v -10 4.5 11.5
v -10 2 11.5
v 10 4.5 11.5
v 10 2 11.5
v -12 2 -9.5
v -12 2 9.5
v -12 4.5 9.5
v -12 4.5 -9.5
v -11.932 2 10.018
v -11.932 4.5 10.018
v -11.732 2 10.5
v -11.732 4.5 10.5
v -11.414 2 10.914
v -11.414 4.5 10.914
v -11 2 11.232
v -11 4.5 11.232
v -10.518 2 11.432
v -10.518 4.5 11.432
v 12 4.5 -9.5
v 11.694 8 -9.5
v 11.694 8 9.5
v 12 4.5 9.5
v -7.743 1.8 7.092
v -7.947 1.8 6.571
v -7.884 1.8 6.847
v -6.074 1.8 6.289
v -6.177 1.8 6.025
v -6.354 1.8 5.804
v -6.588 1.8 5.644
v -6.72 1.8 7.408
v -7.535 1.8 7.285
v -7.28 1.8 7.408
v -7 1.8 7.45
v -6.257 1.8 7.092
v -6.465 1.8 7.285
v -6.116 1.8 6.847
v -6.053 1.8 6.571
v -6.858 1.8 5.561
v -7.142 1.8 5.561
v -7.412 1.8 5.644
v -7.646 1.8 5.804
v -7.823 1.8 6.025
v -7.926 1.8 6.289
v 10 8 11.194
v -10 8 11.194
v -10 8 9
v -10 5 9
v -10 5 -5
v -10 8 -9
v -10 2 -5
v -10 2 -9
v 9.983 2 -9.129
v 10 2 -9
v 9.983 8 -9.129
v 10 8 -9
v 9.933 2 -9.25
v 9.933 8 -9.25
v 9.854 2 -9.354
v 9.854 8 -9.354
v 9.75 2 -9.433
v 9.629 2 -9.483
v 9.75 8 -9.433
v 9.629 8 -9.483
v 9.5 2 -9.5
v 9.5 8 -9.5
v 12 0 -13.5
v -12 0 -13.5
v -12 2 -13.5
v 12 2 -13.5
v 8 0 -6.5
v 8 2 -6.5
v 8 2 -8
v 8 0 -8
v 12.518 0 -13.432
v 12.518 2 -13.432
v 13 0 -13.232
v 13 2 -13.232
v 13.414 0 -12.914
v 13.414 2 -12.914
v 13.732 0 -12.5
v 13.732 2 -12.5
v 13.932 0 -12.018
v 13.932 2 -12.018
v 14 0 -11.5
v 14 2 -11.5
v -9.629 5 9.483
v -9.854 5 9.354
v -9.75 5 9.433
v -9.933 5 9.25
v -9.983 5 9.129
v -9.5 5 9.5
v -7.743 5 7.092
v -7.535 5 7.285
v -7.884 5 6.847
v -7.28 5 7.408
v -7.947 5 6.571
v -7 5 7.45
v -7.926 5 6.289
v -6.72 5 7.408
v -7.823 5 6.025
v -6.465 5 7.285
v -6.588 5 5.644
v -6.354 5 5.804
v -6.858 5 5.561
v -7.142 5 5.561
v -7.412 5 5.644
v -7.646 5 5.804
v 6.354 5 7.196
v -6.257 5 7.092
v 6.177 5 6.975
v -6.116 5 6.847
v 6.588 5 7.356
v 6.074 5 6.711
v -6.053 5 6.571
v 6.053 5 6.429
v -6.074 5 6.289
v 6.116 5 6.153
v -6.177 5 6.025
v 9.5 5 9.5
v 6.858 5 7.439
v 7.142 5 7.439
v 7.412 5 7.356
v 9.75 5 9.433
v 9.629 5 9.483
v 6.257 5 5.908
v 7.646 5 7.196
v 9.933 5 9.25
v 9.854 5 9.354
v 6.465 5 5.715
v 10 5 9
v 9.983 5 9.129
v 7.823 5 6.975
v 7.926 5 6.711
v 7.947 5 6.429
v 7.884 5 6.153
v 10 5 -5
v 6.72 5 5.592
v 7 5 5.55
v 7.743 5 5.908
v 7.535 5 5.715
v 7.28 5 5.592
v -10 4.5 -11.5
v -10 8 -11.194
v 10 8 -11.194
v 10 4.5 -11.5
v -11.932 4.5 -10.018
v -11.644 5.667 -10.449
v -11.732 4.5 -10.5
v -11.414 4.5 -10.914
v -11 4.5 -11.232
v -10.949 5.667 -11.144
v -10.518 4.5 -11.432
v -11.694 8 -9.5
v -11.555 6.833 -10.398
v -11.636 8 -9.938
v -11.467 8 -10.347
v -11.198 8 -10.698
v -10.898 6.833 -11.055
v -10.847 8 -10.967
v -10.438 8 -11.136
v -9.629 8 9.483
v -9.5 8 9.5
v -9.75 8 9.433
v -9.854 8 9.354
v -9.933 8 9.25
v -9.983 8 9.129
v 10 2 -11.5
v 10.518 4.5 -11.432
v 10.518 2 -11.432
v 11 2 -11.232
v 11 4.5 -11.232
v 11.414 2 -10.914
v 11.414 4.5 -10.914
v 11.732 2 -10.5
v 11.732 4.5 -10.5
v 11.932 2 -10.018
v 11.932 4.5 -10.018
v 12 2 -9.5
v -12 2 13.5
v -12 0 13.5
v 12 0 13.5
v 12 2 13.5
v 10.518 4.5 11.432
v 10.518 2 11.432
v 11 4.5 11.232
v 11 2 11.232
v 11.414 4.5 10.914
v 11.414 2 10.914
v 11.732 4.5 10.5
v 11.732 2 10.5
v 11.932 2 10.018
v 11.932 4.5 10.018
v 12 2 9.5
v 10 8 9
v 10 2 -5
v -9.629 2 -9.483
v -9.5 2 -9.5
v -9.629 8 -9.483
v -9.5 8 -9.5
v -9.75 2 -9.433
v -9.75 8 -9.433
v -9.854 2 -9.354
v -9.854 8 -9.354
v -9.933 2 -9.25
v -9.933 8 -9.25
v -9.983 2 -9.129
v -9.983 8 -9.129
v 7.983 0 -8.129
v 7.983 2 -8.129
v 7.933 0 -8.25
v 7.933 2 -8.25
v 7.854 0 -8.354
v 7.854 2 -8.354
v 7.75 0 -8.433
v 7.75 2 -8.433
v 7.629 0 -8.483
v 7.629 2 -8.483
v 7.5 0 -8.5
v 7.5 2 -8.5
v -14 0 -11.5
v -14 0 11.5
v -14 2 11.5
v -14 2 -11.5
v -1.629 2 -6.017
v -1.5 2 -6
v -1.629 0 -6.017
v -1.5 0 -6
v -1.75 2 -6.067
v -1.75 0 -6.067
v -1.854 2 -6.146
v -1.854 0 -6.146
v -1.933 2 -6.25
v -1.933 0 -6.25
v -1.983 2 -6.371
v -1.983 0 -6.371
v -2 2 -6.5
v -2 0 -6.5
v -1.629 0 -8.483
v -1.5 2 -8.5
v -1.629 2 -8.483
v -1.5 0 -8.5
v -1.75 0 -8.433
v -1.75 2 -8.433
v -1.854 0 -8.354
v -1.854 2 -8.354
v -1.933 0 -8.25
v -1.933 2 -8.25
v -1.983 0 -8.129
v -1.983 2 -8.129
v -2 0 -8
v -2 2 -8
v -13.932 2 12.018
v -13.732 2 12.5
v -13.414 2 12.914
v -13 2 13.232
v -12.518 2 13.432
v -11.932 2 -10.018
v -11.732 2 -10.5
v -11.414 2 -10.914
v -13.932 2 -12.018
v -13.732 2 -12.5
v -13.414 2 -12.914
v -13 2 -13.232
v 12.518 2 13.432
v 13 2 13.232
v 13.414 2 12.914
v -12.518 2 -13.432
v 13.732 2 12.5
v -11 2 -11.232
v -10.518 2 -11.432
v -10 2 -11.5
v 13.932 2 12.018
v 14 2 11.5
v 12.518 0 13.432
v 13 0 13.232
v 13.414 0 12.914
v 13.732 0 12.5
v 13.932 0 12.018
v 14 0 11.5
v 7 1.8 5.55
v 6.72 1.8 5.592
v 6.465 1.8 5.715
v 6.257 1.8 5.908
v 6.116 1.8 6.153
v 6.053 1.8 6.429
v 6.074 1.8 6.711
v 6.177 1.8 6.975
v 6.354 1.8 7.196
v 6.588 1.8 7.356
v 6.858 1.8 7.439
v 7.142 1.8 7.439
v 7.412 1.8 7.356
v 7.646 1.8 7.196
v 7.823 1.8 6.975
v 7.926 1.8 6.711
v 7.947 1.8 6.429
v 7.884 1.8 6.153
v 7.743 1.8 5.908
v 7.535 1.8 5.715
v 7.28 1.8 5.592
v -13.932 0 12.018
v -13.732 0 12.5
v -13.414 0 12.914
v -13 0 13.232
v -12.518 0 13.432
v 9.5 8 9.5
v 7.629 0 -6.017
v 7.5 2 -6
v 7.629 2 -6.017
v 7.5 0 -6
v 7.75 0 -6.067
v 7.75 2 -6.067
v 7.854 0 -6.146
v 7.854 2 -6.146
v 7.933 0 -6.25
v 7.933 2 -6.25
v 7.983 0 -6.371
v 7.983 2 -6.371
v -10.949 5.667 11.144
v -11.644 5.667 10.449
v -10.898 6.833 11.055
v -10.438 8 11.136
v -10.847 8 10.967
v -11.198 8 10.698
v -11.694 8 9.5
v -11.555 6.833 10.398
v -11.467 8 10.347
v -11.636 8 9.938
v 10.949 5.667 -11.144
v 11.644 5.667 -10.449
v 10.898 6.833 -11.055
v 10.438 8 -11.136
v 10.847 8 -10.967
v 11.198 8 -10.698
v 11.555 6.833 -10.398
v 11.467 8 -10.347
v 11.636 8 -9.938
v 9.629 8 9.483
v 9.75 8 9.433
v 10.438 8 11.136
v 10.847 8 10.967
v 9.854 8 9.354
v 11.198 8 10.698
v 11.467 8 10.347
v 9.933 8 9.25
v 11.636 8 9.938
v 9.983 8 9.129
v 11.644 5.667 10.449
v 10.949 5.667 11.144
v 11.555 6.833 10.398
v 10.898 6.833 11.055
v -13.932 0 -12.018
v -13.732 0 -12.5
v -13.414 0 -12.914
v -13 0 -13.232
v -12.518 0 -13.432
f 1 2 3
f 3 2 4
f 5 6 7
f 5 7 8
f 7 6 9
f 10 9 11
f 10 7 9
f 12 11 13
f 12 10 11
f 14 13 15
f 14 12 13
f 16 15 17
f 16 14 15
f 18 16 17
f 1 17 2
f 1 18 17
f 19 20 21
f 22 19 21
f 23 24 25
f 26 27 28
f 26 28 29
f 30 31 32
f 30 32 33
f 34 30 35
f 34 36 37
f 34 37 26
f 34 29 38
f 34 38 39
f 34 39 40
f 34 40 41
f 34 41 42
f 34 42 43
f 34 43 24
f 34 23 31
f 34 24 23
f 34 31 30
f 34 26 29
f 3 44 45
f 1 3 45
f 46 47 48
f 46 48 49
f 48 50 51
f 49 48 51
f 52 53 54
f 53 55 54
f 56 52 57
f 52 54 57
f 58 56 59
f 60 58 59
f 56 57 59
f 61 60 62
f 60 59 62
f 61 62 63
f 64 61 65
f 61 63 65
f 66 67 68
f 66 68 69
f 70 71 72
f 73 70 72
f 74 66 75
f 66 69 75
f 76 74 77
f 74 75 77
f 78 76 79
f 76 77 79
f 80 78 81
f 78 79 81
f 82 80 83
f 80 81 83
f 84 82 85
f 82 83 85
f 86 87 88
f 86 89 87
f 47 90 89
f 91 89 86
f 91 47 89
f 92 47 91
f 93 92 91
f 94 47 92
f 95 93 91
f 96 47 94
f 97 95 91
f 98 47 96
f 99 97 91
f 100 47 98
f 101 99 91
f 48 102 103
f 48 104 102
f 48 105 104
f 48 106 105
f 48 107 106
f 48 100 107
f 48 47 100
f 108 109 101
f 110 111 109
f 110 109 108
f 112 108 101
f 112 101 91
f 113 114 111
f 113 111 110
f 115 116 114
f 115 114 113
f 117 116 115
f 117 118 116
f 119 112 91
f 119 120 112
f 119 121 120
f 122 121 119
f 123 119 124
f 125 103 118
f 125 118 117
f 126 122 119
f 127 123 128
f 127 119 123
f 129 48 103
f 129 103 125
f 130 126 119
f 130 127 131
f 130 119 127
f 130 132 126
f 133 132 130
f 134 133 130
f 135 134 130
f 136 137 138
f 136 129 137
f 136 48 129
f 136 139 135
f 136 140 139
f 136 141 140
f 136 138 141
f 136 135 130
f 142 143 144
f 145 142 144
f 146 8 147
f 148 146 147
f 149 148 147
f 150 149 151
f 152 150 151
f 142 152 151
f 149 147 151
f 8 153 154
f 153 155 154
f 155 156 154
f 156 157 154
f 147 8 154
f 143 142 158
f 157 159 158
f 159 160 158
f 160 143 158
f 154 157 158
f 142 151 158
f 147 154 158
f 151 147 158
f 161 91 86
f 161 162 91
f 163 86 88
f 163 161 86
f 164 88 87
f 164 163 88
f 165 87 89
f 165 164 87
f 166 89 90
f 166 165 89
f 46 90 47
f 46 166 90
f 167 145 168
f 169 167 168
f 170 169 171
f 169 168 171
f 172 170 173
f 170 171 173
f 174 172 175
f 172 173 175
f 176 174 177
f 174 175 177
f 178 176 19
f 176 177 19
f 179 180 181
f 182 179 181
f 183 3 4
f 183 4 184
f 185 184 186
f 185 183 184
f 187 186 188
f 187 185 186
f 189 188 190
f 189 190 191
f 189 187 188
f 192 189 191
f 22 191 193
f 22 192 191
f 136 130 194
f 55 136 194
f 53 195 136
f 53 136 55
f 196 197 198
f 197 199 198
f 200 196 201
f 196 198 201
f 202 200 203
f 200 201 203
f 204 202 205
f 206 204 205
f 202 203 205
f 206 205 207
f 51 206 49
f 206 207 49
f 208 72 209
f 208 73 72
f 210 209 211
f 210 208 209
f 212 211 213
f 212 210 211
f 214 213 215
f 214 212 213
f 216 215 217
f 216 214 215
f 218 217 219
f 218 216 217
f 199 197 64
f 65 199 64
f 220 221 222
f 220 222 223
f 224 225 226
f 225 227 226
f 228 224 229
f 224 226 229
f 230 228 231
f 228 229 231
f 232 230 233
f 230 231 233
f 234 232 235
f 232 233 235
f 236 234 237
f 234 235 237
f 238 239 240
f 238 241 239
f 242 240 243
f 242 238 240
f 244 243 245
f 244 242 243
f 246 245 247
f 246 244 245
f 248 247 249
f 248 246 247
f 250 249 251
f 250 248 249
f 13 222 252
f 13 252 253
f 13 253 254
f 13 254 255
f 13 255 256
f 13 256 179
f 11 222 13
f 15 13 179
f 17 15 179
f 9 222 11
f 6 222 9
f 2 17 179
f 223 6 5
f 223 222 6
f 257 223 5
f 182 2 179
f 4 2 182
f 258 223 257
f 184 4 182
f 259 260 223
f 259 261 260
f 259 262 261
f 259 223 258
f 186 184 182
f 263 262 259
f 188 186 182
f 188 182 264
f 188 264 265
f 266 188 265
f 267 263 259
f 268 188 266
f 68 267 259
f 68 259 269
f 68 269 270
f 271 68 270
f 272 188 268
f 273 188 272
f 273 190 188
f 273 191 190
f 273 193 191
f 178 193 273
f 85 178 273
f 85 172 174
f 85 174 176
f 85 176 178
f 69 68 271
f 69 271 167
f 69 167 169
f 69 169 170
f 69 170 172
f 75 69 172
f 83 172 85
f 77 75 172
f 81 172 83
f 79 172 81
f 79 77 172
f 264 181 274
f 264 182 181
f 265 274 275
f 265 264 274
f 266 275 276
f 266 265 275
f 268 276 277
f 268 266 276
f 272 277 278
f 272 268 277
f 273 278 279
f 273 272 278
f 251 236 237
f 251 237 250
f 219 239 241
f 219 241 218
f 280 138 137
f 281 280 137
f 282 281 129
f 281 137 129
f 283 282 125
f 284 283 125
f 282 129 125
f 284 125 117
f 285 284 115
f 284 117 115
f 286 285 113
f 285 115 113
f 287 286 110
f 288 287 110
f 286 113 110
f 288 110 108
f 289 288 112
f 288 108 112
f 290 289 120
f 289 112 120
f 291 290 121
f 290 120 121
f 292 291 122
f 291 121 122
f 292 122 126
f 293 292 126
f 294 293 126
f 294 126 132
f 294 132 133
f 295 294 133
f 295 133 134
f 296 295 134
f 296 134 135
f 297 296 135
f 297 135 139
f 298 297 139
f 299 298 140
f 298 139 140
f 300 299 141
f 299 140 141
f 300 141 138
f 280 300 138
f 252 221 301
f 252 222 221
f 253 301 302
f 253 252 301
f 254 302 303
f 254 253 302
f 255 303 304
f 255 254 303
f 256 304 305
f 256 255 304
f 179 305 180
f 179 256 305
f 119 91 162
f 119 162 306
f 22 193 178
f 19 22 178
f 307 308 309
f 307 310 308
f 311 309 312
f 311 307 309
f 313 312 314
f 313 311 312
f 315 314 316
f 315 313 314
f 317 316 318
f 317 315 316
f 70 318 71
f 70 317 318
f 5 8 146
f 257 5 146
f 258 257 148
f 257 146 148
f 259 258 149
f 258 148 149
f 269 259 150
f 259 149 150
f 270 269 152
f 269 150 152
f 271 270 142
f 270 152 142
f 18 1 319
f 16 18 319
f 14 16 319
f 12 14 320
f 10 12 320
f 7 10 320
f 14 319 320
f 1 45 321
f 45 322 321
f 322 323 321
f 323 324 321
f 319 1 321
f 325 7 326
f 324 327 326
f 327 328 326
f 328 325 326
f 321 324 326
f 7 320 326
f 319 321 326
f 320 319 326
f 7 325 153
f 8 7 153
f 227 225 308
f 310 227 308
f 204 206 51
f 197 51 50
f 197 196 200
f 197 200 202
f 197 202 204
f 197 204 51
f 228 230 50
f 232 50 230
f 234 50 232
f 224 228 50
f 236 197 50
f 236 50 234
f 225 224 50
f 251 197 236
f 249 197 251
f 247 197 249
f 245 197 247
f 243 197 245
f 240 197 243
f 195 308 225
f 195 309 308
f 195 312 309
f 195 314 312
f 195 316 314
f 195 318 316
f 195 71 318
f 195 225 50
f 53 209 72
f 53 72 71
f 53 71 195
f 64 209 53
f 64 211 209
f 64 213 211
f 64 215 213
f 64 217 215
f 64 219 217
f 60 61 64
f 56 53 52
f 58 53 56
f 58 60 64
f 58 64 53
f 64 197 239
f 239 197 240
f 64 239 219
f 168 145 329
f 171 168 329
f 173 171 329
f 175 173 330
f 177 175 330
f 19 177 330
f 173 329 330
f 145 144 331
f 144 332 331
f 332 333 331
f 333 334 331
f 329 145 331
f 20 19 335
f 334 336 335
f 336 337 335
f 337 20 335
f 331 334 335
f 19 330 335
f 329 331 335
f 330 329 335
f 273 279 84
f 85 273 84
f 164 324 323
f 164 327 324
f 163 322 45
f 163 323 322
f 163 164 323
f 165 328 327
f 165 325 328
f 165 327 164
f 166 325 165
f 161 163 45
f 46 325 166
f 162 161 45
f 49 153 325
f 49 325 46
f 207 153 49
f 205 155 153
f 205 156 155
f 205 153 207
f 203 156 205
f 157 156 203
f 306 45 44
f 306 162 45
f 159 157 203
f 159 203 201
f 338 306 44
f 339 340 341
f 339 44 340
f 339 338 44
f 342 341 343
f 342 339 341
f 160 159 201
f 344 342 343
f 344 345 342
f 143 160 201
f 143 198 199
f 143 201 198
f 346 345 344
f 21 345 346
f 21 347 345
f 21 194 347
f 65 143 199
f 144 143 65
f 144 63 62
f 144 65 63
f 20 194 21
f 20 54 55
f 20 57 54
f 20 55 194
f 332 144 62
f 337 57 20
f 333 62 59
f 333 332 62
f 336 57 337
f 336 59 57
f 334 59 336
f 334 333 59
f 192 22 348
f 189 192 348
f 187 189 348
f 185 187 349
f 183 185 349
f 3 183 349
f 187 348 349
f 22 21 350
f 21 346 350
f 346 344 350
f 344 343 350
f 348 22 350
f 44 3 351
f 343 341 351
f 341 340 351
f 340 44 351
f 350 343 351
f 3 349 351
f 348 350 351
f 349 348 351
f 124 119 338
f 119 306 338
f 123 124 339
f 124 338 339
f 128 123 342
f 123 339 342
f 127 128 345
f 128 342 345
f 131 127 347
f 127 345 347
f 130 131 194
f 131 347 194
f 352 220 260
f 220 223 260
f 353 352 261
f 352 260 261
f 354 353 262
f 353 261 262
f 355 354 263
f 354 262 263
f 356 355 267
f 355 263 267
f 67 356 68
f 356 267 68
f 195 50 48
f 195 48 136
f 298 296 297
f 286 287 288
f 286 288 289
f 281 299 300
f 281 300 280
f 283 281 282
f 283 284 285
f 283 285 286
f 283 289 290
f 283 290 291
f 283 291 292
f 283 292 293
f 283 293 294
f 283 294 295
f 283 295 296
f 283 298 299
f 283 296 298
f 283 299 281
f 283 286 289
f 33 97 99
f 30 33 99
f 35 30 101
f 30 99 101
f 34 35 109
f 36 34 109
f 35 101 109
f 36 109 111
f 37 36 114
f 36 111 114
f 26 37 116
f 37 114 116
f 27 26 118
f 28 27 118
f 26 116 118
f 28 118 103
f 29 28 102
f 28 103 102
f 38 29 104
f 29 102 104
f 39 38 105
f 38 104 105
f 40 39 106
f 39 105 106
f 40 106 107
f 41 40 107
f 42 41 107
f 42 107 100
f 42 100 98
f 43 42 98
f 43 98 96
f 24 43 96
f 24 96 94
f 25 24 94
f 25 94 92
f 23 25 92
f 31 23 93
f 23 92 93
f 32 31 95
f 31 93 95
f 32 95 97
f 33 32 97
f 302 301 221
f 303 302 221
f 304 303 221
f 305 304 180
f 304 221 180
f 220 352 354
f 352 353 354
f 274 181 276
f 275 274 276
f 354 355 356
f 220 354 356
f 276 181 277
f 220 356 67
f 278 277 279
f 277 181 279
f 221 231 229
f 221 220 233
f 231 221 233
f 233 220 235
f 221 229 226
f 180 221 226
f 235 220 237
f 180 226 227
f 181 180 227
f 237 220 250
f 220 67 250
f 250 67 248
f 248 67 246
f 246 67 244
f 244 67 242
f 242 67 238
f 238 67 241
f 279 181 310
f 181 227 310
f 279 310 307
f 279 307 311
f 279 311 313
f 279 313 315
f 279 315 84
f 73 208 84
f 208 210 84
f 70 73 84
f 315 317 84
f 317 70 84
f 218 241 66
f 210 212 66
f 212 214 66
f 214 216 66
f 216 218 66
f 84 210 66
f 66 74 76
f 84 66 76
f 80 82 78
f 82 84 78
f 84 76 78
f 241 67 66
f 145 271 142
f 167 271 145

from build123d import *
from OCP.BRepFilletAPI import BRepFilletAPI_MakeChamfer

# Parameters (mm, degrees)
SKETCH1_W           = 28
SKETCH1_H           = 27
BOSS_EXTRUDE1_DEPTH = 2
SKETCH2_W           = 10
SKETCH2_H           = 2.5
CUT_EXTRUDE1_DEPTH  = 2
SKETCH3_W           = 20
SKETCH3_H           = 14.5
BOSS_EXTRUDE2_DEPTH = 3
SKETCH4_W           = 24
SKETCH4_H           = 23
SKETCH4_W_2         = 20
SKETCH4_H_2         = 19
BOSS_EXTRUDE3_DEPTH = 6
SKETCH5_R           = 0.95
CUT_EXTRUDE2_DEPTH  = 3.2
FILLET1_R           = 2
FILLET2_R           = 0.5
CHAMFER1_SIZE       = 3.5
CHAMFER1_SIZE2      = 0.306210322


with BuildPart() as part:
    # Sketch1 → Boss-Extrude1 (new body)
    with BuildSketch(Plane(origin=(0, 0, 0), x_dir=(1, 0, 0), z_dir=(0, 1, 0))):
        Rectangle(SKETCH1_W, SKETCH1_H)
    extrude(amount=BOSS_EXTRUDE1_DEPTH)

    # Sketch2 → Cut-Extrude1 (cut)
    with BuildSketch(Plane(origin=(0, 2, 0), x_dir=(1, 0, 0), z_dir=(0, 1, 0))):
        with Locations((3, 7.25)):
            Rectangle(SKETCH2_W, SKETCH2_H)
    extrude(amount=-CUT_EXTRUDE1_DEPTH, mode=Mode.SUBTRACT)

    # Sketch3 → Boss-Extrude2 (add)
    with BuildSketch(Plane(origin=(0, 2, 0), x_dir=(1, 0, 0), z_dir=(0, 1, 0))):
        with Locations((0, -2.25)):
            Rectangle(SKETCH3_W, SKETCH3_H)
    extrude(amount=BOSS_EXTRUDE2_DEPTH)

    # Sketch4 → Boss-Extrude3 (add)
    with BuildSketch(Plane(origin=(0, 2, 0), x_dir=(1, 0, 0), z_dir=(0, 1, 0))):
        Rectangle(SKETCH4_W, SKETCH4_H)
        Rectangle(SKETCH4_W_2, SKETCH4_H_2, mode=Mode.SUBTRACT)
    extrude(amount=BOSS_EXTRUDE3_DEPTH)

    # Sketch5 → Cut-Extrude2 (cut)
    with BuildSketch(Plane(origin=(0, 5, 0), x_dir=(1, 0, 0), z_dir=(0, 1, 0))):
        with Locations(Location((-7, -6.5, 0), (0, 0, 270))):
            Circle(SKETCH5_R)
        with Locations(Location((7, -6.5, 0), (0, 0, 90))):
            Circle(SKETCH5_R)
    extrude(amount=-CUT_EXTRUDE2_DEPTH, mode=Mode.SUBTRACT)

    # Fillet1
    fillet1_edges = [part.edges().sort_by_distance(p)[0] for p in [
        (12, 5, -11.5),
        (-12, 5, -11.5),
        (-12, 5, 11.5),
        (12, 5, 11.5),
        (14, 1, 13.5),
        (-14, 1, 13.5),
        (-14, 1, -13.5),
        (14, 1, -13.5),
    ]]
    fillet(fillet1_edges, radius=FILLET1_R)

    # Fillet2
    fillet2_edges = [part.edges().sort_by_distance(p)[0] for p in [
        (-2, 1, -8.5),
        (-2, 1, -6),
        (8, 1, -6),
        (8, 1, -8.5),
        (10, 5, -9.5),
        (-10, 6.5, 9.5),
        (10, 6.5, 9.5),
        (-10, 5, -9.5),
    ]]
    fillet(fillet2_edges, radius=FILLET2_R)

    # Chamfer1: one chamfer whose edges measure the first distance from different faces: ONE call of the kernel's chamfer builder (chamfer() names one face for all edges)
    chamfer1_edges_1 = [part.edges().sort_by_distance(p)[0] for p in [
        (0, 8, -11.5),
    ]]
    chamfer1_side_1 = [part.faces().sort_by_distance(p)[0] for p in [
        (0, 5, -11.5),
    ]]
    chamfer1_edges_2 = [part.edges().sort_by_distance(p)[0] for p in [
        (12, 8, 0),
    ]]
    chamfer1_side_2 = [part.faces().sort_by_distance(p)[0] for p in [
        (12, 5, 0),
    ]]
    chamfer1_edges_3 = [part.edges().sort_by_distance(p)[0] for p in [
        (-12, 8, 0),
    ]]
    chamfer1_side_3 = [part.faces().sort_by_distance(p)[0] for p in [
        (-12, 5, 0),
    ]]
    chamfer1_edges_4 = [part.edges().sort_by_distance(p)[0] for p in [
        (0, 8, 11.5),
    ]]
    chamfer1_side_4 = [part.faces().sort_by_distance(p)[0] for p in [
        (0, 5, 11.5),
    ]]
    chamfer1_edges_5 = [part.edges().sort_by_distance(p)[0] for p in [
        (-11.414213562, 8, -10.914213562),
    ]]
    chamfer1_side_5 = [part.faces().sort_by_distance(p)[0] for p in [
        (-11.414213562, 5, -10.914213562),
    ]]
    chamfer1_edges_6 = [part.edges().sort_by_distance(p)[0] for p in [
        (-11.414213562, 8, 10.914213562),
    ]]
    chamfer1_side_6 = [part.faces().sort_by_distance(p)[0] for p in [
        (-11.414213562, 5, 10.914213562),
    ]]
    chamfer1_edges_7 = [part.edges().sort_by_distance(p)[0] for p in [
        (11.414213562, 8, 10.914213562),
    ]]
    chamfer1_side_7 = [part.faces().sort_by_distance(p)[0] for p in [
        (11.414213562, 5, 10.914213562),
    ]]
    chamfer1_edges_8 = [part.edges().sort_by_distance(p)[0] for p in [
        (11.414213562, 8, -10.914213562),
    ]]
    chamfer1_side_8 = [part.faces().sort_by_distance(p)[0] for p in [
        (11.414213562, 5, -10.914213562),
    ]]
    chamfer1 = BRepFilletAPI_MakeChamfer(part.part.solid().wrapped)
    for e in chamfer1_edges_1:
        chamfer1.Add(CHAMFER1_SIZE, CHAMFER1_SIZE2, e.wrapped, chamfer1_side_1[0].wrapped)  # the first distance lies on this face
    for e in chamfer1_edges_2:
        chamfer1.Add(CHAMFER1_SIZE, CHAMFER1_SIZE2, e.wrapped, chamfer1_side_2[0].wrapped)  # the first distance lies on this face
    for e in chamfer1_edges_3:
        chamfer1.Add(CHAMFER1_SIZE, CHAMFER1_SIZE2, e.wrapped, chamfer1_side_3[0].wrapped)  # the first distance lies on this face
    for e in chamfer1_edges_4:
        chamfer1.Add(CHAMFER1_SIZE, CHAMFER1_SIZE2, e.wrapped, chamfer1_side_4[0].wrapped)  # the first distance lies on this face
    for e in chamfer1_edges_5:
        chamfer1.Add(CHAMFER1_SIZE, CHAMFER1_SIZE2, e.wrapped, chamfer1_side_5[0].wrapped)  # the first distance lies on this face
    for e in chamfer1_edges_6:
        chamfer1.Add(CHAMFER1_SIZE, CHAMFER1_SIZE2, e.wrapped, chamfer1_side_6[0].wrapped)  # the first distance lies on this face
    for e in chamfer1_edges_7:
        chamfer1.Add(CHAMFER1_SIZE, CHAMFER1_SIZE2, e.wrapped, chamfer1_side_7[0].wrapped)  # the first distance lies on this face
    for e in chamfer1_edges_8:
        chamfer1.Add(CHAMFER1_SIZE, CHAMFER1_SIZE2, e.wrapped, chamfer1_side_8[0].wrapped)  # the first distance lies on this face
    add(Compound.cast(chamfer1.Shape()), mode=Mode.REPLACE)


solid = part.part
